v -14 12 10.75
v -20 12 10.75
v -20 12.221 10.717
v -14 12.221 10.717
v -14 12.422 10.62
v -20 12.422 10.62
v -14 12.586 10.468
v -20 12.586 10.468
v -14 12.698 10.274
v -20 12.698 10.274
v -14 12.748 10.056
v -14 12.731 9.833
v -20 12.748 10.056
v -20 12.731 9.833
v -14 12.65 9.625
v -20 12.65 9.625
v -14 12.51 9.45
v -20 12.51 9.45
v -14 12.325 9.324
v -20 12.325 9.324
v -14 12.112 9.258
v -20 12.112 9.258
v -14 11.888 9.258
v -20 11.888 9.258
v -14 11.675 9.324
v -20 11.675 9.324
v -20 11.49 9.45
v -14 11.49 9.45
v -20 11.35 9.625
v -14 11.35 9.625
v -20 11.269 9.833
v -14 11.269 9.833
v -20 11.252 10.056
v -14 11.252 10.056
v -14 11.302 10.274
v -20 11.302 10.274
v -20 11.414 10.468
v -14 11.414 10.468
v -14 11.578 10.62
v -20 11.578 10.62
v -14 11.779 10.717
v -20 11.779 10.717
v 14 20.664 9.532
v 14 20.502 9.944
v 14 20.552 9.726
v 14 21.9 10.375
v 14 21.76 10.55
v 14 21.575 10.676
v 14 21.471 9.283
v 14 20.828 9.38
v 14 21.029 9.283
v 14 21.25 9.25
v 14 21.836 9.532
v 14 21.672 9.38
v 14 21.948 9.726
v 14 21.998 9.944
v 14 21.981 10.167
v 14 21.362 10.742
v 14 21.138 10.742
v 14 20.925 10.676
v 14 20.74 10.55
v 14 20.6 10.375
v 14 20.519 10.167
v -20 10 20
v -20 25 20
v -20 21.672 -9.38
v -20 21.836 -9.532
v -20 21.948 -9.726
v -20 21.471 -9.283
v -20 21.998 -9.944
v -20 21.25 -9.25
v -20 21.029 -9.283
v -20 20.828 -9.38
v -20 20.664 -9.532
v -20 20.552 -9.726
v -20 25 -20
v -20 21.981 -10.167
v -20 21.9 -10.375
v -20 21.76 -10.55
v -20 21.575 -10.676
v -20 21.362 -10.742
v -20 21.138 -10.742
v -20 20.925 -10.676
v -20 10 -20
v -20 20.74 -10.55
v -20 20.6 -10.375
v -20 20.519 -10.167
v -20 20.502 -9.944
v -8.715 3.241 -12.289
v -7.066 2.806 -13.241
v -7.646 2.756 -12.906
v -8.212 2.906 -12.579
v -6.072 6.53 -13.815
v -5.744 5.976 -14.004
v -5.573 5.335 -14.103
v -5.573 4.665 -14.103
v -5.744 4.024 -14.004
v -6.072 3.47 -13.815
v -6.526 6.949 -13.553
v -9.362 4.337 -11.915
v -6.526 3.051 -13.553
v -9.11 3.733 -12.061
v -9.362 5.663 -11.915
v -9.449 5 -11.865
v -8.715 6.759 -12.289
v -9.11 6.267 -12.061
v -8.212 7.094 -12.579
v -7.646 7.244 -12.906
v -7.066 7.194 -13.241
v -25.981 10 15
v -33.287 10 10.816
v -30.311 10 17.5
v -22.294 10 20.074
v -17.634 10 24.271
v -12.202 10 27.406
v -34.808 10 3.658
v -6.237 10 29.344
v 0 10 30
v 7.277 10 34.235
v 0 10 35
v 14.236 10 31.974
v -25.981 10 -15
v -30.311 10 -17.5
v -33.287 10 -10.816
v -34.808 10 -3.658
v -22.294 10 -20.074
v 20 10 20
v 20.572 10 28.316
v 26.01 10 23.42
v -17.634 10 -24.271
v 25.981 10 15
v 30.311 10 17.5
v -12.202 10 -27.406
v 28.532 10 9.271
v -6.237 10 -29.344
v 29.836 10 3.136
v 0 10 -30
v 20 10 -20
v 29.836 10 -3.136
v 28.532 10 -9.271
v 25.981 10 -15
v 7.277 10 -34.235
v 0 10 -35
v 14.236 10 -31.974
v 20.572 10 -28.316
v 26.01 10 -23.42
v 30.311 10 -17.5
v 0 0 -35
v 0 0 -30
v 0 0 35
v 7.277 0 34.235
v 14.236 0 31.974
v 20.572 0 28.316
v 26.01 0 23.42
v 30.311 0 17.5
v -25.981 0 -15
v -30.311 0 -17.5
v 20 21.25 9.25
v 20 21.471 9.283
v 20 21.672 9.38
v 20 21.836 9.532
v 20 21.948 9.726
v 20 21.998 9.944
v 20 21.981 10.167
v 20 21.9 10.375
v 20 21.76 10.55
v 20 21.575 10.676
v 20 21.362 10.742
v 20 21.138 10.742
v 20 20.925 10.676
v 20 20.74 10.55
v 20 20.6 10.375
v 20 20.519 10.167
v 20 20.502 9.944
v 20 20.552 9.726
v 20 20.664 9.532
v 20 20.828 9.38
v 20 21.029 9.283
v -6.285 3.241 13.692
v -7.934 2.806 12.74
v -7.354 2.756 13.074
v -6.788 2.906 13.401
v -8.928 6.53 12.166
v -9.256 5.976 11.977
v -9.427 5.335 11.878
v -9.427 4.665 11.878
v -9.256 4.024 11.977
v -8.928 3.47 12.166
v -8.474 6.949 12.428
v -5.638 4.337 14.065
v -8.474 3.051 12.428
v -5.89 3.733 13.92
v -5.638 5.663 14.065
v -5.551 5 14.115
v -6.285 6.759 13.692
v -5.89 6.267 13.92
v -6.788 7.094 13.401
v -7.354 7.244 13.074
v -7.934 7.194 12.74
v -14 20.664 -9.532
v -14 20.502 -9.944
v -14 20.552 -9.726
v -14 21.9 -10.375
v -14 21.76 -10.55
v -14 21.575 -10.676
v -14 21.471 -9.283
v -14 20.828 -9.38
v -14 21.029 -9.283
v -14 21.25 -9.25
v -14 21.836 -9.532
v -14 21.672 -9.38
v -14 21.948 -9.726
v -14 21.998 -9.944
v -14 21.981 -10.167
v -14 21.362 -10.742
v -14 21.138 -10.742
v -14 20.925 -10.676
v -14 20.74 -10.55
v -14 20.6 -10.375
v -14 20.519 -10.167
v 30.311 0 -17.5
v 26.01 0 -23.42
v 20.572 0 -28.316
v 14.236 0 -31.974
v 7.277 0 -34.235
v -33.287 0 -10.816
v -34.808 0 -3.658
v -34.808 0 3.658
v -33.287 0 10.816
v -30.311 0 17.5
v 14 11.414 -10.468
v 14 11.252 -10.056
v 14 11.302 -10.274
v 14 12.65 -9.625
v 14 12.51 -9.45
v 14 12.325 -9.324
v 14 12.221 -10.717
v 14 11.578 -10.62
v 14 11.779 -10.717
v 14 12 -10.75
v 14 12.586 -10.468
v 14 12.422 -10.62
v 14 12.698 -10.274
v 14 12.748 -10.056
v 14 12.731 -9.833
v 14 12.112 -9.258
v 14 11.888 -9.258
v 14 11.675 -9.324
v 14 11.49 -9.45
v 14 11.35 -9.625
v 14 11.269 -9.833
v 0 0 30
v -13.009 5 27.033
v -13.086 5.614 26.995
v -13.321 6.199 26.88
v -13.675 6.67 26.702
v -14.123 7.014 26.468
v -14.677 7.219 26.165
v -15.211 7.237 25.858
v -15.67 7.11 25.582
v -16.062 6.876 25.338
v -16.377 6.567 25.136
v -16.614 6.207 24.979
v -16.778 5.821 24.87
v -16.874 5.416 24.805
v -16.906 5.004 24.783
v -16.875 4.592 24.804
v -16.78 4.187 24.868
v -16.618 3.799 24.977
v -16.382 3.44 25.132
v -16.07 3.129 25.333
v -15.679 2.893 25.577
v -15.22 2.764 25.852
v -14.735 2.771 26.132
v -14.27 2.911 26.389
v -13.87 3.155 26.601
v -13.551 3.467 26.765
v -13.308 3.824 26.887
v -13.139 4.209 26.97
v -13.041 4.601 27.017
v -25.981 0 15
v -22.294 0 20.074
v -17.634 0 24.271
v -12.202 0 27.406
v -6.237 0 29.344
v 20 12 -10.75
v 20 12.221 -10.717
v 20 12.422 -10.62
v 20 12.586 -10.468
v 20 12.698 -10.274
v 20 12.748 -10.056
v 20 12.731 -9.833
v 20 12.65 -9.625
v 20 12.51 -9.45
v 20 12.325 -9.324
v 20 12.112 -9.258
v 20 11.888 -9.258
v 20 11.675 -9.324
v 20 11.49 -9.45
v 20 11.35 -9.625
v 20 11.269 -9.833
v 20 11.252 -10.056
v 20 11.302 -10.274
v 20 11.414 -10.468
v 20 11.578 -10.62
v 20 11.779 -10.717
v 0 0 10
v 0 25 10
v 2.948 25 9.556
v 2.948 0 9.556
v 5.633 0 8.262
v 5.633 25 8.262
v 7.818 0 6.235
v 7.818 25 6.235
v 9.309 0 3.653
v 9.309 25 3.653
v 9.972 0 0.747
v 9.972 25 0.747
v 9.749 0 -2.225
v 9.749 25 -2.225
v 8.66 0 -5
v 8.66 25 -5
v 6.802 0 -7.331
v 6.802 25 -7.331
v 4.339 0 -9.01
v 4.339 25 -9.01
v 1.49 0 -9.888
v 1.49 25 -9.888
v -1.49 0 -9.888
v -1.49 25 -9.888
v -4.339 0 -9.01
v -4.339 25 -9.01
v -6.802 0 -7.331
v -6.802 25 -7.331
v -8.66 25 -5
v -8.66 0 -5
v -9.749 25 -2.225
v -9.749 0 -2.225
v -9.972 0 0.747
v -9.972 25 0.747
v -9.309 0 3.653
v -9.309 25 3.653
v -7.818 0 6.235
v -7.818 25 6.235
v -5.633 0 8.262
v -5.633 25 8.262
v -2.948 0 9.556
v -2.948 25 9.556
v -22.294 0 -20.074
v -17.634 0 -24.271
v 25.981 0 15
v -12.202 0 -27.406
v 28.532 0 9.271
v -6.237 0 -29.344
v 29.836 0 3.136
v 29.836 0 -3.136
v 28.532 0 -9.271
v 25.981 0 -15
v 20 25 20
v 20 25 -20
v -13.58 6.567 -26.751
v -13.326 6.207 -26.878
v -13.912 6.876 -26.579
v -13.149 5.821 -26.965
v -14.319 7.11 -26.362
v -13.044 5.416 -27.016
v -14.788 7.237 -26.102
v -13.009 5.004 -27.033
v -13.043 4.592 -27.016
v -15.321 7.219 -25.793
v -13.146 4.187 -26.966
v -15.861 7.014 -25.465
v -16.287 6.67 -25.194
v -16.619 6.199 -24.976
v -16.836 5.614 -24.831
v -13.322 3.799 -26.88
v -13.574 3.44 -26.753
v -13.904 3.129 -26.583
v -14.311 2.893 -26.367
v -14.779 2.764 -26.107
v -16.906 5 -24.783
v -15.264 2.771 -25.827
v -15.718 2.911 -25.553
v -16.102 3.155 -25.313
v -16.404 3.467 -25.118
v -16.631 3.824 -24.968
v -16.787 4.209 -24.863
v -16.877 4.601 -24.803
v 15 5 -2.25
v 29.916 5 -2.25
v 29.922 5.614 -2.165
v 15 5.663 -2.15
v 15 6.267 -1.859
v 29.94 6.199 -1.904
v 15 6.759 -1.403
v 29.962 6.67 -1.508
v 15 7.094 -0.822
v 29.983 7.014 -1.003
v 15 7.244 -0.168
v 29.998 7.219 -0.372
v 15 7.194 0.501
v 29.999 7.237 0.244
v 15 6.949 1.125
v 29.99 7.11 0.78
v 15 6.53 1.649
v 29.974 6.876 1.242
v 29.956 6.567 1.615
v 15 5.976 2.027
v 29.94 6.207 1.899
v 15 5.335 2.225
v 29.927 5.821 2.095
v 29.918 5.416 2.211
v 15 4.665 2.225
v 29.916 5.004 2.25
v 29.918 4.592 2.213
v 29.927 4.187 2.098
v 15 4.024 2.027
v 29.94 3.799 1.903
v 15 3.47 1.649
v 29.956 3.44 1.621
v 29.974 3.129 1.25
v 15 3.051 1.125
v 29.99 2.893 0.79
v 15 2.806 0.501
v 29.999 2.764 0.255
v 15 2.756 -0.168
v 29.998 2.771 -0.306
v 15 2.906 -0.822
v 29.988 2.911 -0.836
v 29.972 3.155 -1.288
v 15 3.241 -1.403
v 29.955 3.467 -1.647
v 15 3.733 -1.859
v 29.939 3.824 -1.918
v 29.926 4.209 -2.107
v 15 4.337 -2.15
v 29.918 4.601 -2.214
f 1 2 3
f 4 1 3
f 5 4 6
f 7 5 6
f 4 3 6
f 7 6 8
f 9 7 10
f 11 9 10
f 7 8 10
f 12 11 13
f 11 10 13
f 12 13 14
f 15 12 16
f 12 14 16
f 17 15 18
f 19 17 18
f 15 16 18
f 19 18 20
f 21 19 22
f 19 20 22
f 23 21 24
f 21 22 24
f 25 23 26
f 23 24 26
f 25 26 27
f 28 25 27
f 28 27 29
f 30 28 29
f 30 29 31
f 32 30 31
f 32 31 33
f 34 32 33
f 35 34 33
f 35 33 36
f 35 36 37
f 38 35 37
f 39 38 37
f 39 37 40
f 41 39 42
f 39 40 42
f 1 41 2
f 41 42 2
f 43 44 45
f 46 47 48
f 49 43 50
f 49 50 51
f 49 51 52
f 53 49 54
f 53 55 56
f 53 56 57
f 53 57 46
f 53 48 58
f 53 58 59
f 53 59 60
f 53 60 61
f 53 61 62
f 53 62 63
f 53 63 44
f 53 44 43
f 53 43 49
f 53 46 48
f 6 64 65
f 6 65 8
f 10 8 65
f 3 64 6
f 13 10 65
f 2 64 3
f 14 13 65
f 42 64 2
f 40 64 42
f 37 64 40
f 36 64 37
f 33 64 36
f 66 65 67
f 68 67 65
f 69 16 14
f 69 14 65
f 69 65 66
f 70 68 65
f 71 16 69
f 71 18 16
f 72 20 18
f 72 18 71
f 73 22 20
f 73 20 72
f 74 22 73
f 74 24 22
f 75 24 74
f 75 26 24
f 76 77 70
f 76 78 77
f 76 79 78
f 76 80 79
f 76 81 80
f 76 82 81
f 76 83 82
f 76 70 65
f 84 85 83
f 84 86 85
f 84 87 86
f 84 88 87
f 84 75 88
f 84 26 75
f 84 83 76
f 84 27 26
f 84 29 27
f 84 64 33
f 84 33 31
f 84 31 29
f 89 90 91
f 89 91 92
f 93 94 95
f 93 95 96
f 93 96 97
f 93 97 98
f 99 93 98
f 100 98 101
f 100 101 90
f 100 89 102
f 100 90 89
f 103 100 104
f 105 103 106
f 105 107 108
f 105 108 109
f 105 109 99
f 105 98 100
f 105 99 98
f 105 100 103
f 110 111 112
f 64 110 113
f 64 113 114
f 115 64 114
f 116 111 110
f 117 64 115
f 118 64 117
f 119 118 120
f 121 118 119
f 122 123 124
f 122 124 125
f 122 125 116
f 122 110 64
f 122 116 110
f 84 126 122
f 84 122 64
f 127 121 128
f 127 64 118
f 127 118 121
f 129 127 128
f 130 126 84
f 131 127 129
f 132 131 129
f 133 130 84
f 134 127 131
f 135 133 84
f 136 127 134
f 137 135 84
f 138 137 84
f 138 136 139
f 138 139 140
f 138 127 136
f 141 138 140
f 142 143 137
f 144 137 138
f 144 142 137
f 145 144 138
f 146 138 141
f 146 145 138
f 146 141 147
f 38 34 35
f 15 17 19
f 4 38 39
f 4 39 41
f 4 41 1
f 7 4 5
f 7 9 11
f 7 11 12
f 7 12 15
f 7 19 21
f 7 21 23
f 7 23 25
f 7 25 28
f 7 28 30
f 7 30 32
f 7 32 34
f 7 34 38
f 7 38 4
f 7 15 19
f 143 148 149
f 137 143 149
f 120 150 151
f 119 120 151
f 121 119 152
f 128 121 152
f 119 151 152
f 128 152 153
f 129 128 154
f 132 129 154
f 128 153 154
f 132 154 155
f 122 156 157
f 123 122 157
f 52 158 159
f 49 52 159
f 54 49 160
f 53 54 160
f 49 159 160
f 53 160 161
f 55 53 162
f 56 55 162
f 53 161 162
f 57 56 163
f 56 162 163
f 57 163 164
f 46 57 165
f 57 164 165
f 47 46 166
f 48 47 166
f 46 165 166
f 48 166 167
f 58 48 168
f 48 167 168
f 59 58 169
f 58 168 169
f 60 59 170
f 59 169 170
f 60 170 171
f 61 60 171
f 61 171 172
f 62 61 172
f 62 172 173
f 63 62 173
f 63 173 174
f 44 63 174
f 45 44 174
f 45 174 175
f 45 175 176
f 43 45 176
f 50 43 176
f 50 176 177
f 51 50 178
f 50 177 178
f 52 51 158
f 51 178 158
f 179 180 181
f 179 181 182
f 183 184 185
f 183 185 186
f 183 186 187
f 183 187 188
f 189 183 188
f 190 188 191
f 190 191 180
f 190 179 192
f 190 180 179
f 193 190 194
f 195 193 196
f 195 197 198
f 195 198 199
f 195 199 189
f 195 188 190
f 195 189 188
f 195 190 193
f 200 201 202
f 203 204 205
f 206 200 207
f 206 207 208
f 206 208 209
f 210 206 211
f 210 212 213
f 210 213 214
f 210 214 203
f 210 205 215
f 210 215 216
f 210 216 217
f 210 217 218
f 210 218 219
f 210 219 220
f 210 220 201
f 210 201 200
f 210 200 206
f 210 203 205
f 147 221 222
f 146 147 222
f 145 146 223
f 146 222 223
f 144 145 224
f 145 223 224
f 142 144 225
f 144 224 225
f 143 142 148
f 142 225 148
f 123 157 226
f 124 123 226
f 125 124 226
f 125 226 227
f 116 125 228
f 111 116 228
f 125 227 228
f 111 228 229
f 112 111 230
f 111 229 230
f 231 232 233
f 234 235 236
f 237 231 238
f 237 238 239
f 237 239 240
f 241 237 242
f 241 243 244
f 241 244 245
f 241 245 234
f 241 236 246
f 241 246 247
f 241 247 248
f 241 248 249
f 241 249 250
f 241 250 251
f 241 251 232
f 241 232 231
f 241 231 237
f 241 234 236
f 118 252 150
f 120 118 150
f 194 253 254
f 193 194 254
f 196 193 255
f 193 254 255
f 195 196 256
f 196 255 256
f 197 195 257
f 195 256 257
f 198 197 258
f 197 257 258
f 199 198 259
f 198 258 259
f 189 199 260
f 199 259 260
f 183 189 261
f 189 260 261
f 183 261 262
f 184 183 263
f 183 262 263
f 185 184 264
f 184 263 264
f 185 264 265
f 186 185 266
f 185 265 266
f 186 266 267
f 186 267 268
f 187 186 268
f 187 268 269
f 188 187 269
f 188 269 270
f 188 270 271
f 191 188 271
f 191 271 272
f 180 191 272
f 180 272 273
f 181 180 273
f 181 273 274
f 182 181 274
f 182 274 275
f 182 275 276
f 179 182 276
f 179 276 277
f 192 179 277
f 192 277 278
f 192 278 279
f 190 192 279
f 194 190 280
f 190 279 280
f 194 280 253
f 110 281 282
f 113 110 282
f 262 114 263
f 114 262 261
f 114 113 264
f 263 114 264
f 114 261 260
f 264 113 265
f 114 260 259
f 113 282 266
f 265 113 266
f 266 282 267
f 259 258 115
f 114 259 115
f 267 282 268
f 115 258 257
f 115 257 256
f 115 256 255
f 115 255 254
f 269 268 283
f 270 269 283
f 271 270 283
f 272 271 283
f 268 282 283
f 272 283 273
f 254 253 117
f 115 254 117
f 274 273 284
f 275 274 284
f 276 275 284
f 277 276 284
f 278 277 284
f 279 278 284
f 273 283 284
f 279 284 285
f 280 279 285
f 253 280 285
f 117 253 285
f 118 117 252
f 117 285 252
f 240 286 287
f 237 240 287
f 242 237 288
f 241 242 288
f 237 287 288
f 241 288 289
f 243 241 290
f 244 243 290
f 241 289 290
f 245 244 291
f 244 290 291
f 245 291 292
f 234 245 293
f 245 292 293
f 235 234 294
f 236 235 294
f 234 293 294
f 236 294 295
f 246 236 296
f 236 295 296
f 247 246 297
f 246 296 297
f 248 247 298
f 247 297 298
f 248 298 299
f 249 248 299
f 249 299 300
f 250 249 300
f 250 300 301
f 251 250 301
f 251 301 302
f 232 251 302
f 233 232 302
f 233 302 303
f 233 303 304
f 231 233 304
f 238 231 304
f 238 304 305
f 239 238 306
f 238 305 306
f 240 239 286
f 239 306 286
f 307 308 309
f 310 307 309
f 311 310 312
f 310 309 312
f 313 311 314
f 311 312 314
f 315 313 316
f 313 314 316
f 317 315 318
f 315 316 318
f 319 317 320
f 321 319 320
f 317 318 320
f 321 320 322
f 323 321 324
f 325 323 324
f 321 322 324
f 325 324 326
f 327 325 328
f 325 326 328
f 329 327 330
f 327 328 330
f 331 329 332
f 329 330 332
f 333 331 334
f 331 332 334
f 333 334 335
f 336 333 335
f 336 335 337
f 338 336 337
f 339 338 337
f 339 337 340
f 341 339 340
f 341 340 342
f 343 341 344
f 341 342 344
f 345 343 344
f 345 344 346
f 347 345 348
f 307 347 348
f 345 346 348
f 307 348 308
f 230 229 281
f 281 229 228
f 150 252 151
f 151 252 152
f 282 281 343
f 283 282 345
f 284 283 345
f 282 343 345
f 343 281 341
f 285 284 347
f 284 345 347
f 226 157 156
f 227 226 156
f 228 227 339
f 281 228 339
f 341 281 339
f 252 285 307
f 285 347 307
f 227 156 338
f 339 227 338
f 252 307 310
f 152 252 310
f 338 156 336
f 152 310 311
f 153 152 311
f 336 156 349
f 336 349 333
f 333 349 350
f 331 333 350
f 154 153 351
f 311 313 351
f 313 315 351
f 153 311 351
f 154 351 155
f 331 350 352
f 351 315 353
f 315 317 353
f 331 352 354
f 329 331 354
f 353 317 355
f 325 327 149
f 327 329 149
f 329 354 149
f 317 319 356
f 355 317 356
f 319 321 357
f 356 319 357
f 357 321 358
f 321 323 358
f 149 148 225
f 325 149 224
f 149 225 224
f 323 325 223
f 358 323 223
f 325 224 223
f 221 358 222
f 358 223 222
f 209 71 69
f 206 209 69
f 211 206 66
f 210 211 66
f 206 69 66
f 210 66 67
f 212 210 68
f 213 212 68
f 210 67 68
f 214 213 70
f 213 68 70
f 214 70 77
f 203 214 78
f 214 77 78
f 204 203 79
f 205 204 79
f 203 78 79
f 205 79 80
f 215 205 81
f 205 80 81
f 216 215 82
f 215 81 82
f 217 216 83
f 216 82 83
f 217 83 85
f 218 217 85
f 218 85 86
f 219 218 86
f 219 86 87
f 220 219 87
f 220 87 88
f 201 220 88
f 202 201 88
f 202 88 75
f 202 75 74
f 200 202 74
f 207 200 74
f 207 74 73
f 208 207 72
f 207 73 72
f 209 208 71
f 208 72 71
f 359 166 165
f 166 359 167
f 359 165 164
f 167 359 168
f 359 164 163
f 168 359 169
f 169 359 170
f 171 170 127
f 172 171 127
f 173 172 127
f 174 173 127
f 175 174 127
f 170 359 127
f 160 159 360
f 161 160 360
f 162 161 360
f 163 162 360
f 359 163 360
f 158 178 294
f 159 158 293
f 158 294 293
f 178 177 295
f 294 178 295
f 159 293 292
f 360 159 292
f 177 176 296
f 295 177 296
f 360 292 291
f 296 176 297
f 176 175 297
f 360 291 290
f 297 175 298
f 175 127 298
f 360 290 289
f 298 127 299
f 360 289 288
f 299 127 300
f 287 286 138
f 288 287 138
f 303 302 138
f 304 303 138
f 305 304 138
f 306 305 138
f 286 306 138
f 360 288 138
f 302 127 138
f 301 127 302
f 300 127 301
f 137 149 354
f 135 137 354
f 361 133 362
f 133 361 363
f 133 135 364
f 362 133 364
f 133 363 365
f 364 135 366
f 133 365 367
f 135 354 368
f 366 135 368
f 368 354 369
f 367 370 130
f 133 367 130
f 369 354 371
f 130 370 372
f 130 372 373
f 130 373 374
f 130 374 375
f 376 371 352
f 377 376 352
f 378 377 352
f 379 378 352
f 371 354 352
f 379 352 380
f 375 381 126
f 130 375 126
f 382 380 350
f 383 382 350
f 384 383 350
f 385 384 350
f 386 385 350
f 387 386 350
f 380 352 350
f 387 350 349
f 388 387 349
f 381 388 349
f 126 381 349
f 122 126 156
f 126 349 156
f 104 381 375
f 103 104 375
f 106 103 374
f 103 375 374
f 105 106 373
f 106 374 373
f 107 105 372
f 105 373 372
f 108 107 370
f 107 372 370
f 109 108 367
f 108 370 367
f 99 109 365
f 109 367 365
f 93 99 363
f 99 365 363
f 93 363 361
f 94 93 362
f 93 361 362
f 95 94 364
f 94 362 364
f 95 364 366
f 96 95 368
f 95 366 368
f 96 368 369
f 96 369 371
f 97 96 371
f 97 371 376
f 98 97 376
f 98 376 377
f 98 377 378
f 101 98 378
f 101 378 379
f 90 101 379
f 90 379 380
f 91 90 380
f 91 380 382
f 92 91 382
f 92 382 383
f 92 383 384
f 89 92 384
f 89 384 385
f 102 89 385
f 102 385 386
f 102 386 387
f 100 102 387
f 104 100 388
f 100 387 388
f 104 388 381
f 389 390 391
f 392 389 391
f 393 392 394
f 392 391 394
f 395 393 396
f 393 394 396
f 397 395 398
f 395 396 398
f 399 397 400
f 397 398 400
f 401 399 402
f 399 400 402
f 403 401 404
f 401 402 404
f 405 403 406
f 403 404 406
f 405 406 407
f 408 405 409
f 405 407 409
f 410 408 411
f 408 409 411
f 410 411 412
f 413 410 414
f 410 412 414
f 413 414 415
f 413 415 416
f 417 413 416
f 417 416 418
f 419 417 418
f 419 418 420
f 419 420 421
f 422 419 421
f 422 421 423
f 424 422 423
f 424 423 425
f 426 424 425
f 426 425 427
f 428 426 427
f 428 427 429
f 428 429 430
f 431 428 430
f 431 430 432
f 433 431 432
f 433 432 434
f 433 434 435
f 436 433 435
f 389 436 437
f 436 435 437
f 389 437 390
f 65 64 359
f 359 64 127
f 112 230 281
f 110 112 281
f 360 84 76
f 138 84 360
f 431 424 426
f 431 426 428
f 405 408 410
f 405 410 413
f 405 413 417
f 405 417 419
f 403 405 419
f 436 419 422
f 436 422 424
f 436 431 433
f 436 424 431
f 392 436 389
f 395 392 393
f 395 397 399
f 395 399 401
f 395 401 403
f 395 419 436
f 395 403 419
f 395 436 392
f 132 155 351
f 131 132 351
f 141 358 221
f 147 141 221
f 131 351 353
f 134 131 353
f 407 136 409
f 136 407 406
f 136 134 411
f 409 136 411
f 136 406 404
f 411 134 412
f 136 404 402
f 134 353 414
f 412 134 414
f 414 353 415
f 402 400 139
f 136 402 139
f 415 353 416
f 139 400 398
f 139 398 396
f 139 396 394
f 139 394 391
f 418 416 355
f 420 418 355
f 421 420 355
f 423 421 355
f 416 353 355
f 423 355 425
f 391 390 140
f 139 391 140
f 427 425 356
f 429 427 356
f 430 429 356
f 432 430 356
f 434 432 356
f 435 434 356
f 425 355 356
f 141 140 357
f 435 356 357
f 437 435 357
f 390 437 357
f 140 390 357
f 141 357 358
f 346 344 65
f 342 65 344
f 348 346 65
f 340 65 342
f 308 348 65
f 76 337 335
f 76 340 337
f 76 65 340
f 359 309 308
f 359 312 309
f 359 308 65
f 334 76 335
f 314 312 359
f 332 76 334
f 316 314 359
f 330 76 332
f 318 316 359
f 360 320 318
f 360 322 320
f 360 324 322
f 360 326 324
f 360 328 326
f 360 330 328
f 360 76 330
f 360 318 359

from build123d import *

# Parameters (mm, degrees)
SKETCH1_R           = 30
BOSS_EXTRUDE3_DEPTH = 10
SKETCH2_R           = 2.25
CUT_EXTRUDE1_DEPTH  = 25
CIRPATTERN1_COUNT   = 3
SKETCH3_W           = 40
SKETCH3_H           = 40
BOSS_EXTRUDE4_DEPTH = 15
SKETCH5_R           = 10
CUT_EXTRUDE5_DEPTH  = 25
SKETCH4_R           = 0.75
CUT_EXTRUDE6_DEPTH  = 6
CIRPATTERN2_COUNT   = 2


with BuildPart() as part:
    # Sketch1 → Boss-Extrude3 (new body)
    with BuildSketch(Plane(origin=(0, 0, 0), x_dir=(1, 0, 0), z_dir=(0, 1, 0))):
        with BuildLine():
            Line((-25.980762114, 15), (-30.310889132, 17.5))
            ThreePointArc((-30.310889132, 17.5), (-35, 0), (-30.310889132, -17.5))
            Line((-30.310889132, -17.5), (-25.980762114, -15))
            ThreePointArc((-25.980762114, -15), (-30, 0), (-25.980762114, 15))
        make_face()
        Circle(SKETCH1_R)
        with BuildLine():
            Line((0, 35), (0, 30))
            ThreePointArc((0, 30), (15, 25.980762114), (25.980762114, 15))
            Line((25.980762114, 15), (30.310889132, 17.5))
            ThreePointArc((30.310889132, 17.5), (17.5, 30.310889132), (0, 35))
        make_face()
        with BuildLine():
            ThreePointArc((25.980762114, -15), (15, -25.980762114), (0, -30))
            Line((0, -30), (0, -35))
            ThreePointArc((0, -35), (17.5, -30.310889132), (30.310889132, -17.5))
            Line((30.310889132, -17.5), (25.980762114, -15))
        make_face()
    extrude(amount=BOSS_EXTRUDE3_DEPTH)

    # Sketch2 → Cut-Extrude1 (cut)
    with BuildSketch(Plane(origin=(40, 0, 0), x_dir=(0, 0, -1), z_dir=(1, 0, 0))):
        with Locations((0, 5)):
            Circle(SKETCH2_R)
    cut_extrude1 = extrude(amount=-CUT_EXTRUDE1_DEPTH, mode=Mode.SUBTRACT)

    # CirPattern1: Cut-Extrude1 ×3 about axis
    cirpattern1_axis = Axis((0, 0, 0), (0, 1, 0))
    for i in range(1, CIRPATTERN1_COUNT):
        add(cut_extrude1.rotate(cirpattern1_axis, i * 360 / CIRPATTERN1_COUNT), mode=Mode.SUBTRACT)

    # Sketch3 → Boss-Extrude4 (add)
    with BuildSketch(Plane(origin=(0, 10, 0), x_dir=(1, 0, 0), z_dir=(0, 1, 0))):
        Rectangle(SKETCH3_W, SKETCH3_H)
    extrude(amount=BOSS_EXTRUDE4_DEPTH)

    # Sketch5 → Cut-Extrude5 (cut)
    with BuildSketch(Plane(origin=(0, 25, 0), x_dir=(1, 0, 0), z_dir=(0, 1, 0))):
        with Locations(Location((0, 0, 0), (0, 0, 270))):
            Circle(SKETCH5_R)
    extrude(amount=-CUT_EXTRUDE5_DEPTH, mode=Mode.SUBTRACT)

    # Sketch4 → Cut-Extrude6 (cut)
    with BuildSketch(Plane(origin=(20, 0, 0), x_dir=(0, 0, -1), z_dir=(1, 0, 0))):
        with Locations((-10, 21.25)):
            Circle(SKETCH4_R)
        with Locations((10, 12)):
            Circle(SKETCH4_R)
    cut_extrude6 = extrude(amount=-CUT_EXTRUDE6_DEPTH, mode=Mode.SUBTRACT)

    # CirPattern2: Cut-Extrude6 ×2 about axis
    cirpattern2_axis = Axis((0, -28.284271247, 0), (0, 1, 0))
    for i in range(1, CIRPATTERN2_COUNT):
        add(cut_extrude6.rotate(cirpattern2_axis, i * 360 / CIRPATTERN2_COUNT), mode=Mode.SUBTRACT)


solid = part.part
